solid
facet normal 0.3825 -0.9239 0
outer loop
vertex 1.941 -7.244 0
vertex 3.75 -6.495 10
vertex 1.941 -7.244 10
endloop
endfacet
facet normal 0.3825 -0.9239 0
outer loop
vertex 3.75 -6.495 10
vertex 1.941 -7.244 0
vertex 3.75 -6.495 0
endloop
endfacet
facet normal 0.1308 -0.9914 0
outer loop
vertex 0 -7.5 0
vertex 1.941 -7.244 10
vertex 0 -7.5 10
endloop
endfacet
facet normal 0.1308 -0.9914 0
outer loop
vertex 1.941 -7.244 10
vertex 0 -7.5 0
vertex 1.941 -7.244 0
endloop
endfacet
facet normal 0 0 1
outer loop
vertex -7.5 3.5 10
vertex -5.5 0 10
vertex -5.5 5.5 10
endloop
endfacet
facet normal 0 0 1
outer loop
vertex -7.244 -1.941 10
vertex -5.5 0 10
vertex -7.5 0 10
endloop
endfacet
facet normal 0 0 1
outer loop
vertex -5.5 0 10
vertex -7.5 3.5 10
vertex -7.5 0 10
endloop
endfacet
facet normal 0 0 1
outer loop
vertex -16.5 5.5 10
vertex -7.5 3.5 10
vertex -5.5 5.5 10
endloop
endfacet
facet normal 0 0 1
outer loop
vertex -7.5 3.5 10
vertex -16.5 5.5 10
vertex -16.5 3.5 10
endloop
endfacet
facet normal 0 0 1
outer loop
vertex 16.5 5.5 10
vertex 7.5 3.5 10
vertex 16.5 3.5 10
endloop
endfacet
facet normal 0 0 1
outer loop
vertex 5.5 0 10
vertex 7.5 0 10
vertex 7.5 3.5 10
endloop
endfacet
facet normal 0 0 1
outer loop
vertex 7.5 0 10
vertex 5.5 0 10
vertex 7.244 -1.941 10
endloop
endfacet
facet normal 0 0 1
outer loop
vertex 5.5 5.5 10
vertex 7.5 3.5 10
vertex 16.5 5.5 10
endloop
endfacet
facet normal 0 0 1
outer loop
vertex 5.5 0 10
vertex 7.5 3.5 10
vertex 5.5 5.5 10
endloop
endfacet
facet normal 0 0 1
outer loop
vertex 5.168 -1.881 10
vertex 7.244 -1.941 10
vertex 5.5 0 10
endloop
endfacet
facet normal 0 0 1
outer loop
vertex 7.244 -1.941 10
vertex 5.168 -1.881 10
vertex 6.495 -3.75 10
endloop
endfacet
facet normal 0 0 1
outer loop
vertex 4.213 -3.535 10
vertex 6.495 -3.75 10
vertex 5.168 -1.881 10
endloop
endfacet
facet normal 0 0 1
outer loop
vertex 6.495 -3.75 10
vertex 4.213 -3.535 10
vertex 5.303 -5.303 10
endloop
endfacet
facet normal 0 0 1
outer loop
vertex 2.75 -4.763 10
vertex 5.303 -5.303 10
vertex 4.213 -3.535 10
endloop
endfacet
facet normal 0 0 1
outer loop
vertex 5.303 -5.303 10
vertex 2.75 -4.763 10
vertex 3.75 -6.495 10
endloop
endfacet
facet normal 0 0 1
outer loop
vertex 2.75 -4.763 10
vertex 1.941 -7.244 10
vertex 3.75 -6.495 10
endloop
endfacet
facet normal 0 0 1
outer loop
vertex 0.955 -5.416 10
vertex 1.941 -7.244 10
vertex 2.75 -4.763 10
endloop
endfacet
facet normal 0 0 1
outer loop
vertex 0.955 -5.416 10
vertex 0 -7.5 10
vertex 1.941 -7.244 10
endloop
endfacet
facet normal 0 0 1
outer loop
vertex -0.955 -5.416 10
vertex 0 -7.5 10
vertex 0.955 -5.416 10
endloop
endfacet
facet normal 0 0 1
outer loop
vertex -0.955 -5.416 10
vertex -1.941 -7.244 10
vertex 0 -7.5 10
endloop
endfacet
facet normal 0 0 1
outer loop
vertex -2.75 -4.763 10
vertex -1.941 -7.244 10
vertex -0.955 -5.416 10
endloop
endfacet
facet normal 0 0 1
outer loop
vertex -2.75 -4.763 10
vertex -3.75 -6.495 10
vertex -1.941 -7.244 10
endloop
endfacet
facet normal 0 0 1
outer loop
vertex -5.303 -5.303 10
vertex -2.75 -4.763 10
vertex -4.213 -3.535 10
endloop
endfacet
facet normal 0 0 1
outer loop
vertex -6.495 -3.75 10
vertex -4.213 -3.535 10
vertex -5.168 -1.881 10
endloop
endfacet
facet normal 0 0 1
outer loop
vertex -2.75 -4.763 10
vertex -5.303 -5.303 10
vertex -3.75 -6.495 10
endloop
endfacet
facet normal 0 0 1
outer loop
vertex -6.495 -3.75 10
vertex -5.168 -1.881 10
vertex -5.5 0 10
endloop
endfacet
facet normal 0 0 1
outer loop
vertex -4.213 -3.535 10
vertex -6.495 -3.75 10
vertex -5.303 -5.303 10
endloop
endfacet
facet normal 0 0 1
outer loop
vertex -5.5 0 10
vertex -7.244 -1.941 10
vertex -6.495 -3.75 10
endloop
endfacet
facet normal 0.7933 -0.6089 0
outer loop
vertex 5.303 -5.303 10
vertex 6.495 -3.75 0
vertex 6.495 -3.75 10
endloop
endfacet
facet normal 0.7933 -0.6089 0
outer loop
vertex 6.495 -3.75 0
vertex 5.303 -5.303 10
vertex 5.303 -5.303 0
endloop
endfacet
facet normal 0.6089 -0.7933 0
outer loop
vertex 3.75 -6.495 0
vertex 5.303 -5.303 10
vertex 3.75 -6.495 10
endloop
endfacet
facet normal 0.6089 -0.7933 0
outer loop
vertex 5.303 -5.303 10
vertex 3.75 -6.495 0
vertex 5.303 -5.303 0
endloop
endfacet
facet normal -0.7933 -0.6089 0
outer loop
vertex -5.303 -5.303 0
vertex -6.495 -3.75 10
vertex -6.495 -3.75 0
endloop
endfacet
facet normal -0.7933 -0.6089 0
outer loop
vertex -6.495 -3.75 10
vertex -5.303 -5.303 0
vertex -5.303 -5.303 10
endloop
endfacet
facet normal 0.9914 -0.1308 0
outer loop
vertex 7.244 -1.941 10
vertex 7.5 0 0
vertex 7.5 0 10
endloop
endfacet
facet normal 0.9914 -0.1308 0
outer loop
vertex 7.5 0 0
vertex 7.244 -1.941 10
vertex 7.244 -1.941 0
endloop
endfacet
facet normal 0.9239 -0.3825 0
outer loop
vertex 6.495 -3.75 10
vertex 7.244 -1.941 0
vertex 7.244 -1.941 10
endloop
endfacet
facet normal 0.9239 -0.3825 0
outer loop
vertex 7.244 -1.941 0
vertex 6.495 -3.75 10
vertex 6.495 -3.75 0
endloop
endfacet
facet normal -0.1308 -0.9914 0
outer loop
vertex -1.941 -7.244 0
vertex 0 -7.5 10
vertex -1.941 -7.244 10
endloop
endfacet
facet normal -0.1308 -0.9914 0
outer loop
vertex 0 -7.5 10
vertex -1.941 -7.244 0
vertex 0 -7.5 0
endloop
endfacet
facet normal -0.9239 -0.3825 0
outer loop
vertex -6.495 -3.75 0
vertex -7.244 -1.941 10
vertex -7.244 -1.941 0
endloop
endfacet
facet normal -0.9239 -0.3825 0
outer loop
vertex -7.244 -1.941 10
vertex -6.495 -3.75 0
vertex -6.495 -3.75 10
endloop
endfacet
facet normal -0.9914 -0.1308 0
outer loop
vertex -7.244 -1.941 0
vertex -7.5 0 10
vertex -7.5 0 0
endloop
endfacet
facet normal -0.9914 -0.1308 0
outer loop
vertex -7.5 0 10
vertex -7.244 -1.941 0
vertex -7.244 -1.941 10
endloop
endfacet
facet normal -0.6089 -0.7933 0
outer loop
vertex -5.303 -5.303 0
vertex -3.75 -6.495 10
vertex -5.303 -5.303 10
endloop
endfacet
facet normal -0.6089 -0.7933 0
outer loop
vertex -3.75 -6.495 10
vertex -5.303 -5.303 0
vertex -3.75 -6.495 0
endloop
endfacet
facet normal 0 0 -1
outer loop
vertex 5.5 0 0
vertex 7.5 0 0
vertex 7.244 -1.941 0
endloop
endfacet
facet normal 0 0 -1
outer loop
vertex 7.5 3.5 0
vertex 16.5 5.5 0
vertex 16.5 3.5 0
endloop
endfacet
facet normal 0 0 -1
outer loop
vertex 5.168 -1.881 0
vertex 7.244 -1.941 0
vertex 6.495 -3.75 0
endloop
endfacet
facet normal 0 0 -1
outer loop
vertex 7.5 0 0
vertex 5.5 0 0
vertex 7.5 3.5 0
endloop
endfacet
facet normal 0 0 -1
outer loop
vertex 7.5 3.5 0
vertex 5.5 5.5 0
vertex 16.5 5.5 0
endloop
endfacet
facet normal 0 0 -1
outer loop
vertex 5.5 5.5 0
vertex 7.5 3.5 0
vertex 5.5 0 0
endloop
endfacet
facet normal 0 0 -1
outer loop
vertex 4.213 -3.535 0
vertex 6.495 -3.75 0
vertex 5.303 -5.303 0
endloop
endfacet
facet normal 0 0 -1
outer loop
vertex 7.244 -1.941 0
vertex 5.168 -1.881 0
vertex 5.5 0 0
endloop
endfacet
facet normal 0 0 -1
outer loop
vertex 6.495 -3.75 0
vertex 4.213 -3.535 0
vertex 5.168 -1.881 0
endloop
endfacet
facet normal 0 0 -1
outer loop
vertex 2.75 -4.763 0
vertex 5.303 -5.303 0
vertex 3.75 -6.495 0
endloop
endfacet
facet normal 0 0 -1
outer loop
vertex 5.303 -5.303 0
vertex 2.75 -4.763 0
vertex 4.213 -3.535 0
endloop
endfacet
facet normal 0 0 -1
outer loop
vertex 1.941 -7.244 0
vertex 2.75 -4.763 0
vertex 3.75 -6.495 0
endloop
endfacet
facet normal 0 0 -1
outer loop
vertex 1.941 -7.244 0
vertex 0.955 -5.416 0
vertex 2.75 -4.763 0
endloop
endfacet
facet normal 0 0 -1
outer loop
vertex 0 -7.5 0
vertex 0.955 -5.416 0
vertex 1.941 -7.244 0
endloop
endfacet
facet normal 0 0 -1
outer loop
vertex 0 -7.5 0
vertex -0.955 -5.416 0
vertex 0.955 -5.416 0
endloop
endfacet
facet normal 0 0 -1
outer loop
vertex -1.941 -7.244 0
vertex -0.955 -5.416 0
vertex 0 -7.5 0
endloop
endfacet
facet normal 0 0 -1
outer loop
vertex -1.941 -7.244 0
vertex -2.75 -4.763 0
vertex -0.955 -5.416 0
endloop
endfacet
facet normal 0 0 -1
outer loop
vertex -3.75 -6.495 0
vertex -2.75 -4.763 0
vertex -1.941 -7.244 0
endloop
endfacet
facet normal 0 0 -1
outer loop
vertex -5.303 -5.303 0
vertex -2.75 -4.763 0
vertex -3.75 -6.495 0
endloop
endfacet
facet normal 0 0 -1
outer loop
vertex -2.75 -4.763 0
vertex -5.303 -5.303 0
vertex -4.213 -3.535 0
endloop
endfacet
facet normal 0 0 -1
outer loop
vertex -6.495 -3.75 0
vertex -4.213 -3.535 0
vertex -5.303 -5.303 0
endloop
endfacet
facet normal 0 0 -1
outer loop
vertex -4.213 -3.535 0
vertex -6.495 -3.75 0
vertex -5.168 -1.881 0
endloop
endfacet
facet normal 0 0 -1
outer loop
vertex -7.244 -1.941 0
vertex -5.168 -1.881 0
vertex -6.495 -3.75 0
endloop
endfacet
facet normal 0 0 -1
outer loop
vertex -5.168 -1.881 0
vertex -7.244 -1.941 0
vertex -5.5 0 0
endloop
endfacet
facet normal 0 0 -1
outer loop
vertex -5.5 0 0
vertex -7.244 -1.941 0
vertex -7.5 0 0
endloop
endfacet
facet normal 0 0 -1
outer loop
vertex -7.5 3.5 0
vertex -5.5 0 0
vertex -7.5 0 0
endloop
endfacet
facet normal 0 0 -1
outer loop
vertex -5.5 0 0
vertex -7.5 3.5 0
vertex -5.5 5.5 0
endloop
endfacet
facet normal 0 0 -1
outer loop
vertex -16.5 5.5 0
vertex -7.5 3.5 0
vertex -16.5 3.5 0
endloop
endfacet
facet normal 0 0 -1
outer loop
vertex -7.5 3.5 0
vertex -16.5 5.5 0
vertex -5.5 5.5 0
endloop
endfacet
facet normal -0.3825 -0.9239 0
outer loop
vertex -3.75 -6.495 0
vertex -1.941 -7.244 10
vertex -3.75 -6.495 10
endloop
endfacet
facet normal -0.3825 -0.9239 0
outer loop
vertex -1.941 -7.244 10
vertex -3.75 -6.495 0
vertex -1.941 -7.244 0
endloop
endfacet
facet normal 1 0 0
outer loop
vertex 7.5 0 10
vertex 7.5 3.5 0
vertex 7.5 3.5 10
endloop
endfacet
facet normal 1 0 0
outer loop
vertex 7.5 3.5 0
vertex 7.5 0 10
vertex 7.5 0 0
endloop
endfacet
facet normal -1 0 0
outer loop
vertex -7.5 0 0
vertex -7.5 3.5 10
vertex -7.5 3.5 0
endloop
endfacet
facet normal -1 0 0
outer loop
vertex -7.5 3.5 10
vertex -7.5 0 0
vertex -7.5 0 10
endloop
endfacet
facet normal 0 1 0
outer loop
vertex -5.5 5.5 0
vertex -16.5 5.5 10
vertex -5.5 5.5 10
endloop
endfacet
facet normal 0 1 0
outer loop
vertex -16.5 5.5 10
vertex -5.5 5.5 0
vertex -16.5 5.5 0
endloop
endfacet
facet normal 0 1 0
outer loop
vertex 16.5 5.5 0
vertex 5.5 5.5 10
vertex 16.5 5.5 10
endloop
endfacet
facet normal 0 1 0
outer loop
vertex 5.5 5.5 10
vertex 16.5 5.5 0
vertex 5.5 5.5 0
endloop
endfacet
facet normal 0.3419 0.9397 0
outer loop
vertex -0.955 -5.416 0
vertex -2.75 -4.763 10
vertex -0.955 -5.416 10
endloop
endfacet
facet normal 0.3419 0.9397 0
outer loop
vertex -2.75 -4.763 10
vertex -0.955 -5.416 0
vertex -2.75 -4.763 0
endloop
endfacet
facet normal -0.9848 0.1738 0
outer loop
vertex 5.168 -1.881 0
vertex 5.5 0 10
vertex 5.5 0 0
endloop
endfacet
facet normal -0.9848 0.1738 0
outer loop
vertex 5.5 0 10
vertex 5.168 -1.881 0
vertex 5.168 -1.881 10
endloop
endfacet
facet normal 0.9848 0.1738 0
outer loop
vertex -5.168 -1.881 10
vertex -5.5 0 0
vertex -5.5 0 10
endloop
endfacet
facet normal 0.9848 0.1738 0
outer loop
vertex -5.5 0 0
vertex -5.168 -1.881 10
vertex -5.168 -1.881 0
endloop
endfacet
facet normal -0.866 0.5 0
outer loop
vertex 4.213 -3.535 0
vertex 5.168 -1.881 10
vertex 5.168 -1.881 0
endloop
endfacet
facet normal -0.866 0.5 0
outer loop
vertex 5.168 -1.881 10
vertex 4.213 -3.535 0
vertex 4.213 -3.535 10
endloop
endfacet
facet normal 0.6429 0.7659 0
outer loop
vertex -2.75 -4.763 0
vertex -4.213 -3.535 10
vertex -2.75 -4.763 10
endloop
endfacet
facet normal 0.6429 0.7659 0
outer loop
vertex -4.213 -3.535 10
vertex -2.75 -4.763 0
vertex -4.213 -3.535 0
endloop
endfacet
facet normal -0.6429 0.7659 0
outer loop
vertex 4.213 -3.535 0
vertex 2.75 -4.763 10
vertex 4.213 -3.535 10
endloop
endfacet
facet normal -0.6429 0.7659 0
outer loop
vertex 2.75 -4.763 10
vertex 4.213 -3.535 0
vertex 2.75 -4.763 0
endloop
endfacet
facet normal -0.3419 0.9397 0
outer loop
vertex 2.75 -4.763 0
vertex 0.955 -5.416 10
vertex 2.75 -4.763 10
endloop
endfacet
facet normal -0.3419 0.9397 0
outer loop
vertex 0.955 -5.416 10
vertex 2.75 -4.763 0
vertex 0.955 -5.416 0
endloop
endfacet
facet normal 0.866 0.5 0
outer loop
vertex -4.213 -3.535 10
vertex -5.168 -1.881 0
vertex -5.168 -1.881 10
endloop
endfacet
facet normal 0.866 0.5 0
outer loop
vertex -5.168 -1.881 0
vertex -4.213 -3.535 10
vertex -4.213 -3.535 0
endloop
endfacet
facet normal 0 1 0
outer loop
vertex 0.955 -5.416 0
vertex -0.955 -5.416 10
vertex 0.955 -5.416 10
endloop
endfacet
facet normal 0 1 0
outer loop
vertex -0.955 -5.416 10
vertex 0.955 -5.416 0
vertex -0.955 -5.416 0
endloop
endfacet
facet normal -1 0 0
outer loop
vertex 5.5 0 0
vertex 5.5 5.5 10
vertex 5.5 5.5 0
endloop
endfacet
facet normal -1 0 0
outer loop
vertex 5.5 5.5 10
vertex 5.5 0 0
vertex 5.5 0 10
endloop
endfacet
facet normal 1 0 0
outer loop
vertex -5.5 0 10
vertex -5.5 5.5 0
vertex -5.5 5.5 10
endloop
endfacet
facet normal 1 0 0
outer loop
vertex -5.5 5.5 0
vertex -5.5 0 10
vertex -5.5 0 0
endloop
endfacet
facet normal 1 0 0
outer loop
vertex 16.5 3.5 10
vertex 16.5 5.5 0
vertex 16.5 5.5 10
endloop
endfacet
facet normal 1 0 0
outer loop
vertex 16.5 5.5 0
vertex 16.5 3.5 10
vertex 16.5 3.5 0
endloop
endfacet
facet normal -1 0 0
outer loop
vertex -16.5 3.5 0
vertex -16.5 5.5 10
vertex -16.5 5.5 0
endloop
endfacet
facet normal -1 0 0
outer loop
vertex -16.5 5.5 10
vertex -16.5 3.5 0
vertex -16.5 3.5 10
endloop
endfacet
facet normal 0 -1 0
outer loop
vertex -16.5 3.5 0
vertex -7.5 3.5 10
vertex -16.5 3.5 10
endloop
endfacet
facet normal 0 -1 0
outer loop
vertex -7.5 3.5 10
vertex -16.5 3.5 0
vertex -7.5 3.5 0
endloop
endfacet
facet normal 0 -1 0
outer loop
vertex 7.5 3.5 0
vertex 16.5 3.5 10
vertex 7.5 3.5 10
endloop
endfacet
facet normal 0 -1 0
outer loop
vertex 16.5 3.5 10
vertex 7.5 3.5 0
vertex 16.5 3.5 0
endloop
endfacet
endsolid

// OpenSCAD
smidge = 0.5;

module cylinder_part_of_arch(diameter, grow, width) {
  translate([0, 0, -.5*grow])
    intersection() {
      cylinder(d = diameter, h = grow + width);
      translate([-.5*diameter, -.5*diameter, 0]) 
        cube([diameter, diameter/2+smidge, width+2*smidge]);
    }
}

module straight_sides_of_arch(wall_height, diameter, grow, width) {
  translate([-diameter/2, 0, -.5*grow]) 
    cube([diameter, wall_height + grow, width + grow]);
}

module arch(dimensions, diameter, grow = 0) {
  cylinder_part_of_arch(diameter, grow, width(dimensions));
  straight_sides_of_arch(wall_height(dimensions), diameter, grow, width(dimensions));
}

module tunnel_substance(dimensions) {
  diameter = tunnel_outside_diameter(dimensions);
  arch(dimensions, diameter);
}

module tunnel_hole(dimensions) {
  grow = 2 * smidge;
  diameter = cable_diameter(dimensions);
  arch(dimensions, diameter, grow);
}

module tunnel(dimensions) {
  difference() {
    tunnel_substance(dimensions);
    tunnel_hole(dimensions);
  }
}

module base(dimensions) {
  base_extent = tunnel_outside_diameter(dimensions) + 4 * thickness(dimensions) + 2 * screw_head_diameter(dimensions);
  difference() {
    translate([-base_extent/2, cable_diameter(dimensions)/2 - thickness(dimensions), 0]) 
      cube([base_extent, thickness(dimensions), width(dimensions)]);
    tunnel_hole(dimensions);
  }
}

function cable_diameter(dimensions) = dimensions[0];
function wall_height(dimensions) = cable_diameter(dimensions)/2;
function screw_head_height(dimensions) = dimensions[1];
function thickness(dimensions) = screw_head_height(dimensions);
function screw_head_diameter(dimensions) = dimensions[2];
function width(dimensions) = 2 * screw_head_diameter(dimensions);
function tunnel_outside_diameter(dimensions) = cable_diameter(dimensions) + 2 * thickness(dimensions);

module tie_down(cable_diameter, screw_head_height, screw_head_diameter) {
  dimensions = [cable_diameter, screw_head_height, screw_head_diameter];
  union() {
    tunnel(dimensions);
    base(dimensions);
  }
}

tie_down(cable_diameter = 11, screw_head_height = 2, screw_head_diameter = 5);
